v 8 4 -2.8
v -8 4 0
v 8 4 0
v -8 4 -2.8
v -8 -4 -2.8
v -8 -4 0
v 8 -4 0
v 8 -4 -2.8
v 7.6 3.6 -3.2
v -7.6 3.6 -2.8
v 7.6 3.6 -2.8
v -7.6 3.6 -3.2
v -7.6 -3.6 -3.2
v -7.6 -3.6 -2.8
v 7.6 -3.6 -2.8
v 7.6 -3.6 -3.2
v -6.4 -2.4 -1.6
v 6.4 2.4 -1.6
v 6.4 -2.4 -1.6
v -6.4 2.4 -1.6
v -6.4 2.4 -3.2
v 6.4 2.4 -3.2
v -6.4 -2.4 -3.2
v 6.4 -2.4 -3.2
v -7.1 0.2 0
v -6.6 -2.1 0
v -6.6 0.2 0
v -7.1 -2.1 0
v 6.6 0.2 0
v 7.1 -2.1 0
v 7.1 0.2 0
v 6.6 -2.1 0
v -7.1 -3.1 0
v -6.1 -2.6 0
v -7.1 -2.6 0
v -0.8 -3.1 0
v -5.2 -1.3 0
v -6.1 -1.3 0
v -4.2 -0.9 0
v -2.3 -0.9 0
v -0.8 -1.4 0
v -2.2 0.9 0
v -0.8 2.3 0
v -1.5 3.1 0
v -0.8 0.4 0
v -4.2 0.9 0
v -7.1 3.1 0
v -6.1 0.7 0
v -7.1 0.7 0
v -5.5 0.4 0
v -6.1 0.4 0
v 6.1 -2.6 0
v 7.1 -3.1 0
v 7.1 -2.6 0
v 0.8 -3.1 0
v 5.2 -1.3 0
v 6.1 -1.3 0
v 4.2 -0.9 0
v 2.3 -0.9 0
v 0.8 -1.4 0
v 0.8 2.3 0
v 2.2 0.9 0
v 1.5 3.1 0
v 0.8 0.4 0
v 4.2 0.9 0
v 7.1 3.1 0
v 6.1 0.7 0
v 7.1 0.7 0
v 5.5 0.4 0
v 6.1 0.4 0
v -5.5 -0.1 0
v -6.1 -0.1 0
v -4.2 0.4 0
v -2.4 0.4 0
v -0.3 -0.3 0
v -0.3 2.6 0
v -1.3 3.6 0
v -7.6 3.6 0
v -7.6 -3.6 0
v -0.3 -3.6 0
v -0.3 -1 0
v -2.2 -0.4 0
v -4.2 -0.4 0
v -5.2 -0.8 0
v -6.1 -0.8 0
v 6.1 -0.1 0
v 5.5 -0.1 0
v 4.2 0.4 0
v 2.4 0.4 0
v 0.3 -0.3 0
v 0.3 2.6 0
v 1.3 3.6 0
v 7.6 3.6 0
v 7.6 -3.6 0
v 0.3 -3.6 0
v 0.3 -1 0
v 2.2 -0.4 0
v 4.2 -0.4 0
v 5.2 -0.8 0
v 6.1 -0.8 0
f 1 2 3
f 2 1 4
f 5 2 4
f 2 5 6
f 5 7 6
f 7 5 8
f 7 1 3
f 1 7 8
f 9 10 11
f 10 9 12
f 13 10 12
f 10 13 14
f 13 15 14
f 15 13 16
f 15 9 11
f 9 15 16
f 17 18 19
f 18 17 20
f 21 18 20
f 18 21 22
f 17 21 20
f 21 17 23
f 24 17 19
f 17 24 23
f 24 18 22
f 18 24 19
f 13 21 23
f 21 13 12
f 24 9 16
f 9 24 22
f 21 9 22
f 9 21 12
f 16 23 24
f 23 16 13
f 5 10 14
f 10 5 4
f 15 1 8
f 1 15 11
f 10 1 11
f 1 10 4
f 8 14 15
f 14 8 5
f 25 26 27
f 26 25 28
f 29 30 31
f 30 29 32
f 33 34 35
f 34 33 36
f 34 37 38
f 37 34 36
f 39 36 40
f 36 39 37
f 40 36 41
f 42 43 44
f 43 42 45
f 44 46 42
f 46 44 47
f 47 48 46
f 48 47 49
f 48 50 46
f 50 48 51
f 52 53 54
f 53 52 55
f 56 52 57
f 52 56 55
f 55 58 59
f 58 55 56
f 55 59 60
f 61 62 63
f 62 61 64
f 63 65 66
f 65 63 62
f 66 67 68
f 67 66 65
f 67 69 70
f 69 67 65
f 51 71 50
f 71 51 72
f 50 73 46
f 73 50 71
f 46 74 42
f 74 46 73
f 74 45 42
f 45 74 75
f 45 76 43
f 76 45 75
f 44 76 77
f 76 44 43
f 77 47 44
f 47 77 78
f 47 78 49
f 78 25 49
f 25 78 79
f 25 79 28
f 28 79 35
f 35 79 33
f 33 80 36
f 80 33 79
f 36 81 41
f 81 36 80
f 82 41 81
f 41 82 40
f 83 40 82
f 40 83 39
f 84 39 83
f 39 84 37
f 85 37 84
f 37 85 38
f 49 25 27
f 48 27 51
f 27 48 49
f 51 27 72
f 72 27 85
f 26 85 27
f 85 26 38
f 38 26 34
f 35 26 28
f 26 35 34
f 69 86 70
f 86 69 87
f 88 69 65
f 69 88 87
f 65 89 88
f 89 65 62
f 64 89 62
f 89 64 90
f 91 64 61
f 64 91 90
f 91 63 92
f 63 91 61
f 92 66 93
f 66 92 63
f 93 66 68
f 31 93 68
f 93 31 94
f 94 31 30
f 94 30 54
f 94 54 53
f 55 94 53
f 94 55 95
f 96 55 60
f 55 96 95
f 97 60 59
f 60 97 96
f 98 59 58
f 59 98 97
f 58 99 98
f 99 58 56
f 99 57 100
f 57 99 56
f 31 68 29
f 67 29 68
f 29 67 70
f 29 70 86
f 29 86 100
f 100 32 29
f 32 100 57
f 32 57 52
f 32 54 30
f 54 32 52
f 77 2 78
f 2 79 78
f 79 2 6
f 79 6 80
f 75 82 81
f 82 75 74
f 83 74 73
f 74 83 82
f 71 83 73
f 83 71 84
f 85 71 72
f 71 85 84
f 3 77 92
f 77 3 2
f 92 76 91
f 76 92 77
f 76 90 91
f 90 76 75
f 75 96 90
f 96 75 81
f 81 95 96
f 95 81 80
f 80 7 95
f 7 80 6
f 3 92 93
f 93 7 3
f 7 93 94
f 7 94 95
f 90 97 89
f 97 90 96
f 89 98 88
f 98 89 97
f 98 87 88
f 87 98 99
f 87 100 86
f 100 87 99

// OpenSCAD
// file: ../p/box5.scad
use <../lib.scad>
function ldraw_lib__box5() = [
// 0 Box with 5 Faces and All Edges
// 0 Name: box5.dat
// 0 Author: James Jessiman
// 0 !LDRAW_ORG Primitive UPDATE 2012-01
// 0 !LICENSE Licensed under CC BY 4.0 : see CAreadme.txt
// 
// 0 BFC CERTIFY CCW
  [0,"BFC","CERTIFY"],
  [0,"BFC","CCW"],
// 
// 0 !HISTORY 2002-04-03 [sbliss] Modified for BFC compliance
// 0 !HISTORY 2002-04-25 [PTadmin] Official Update 2002-02
// 0 !HISTORY 2007-06-24 [PTadmin] Header formatted for Contributor Agreement
// 0 !HISTORY 2008-07-01 [PTadmin] Official Update 2008-01
// 0 !HISTORY 2012-02-16 [Philo] Changed to CCW
// 0 !HISTORY 2012-03-30 [PTadmin] Official Update 2012-01
// 
// 
// 2 24 1 1 1 -1 1 1
  [2,24,1,1,1,-1,1,1],
// 2 24 -1 1 1 -1 1 -1
  [2,24,-1,1,1,-1,1,-1],
// 2 24 -1 1 -1 1 1 -1
  [2,24,-1,1,-1,1,1,-1],
// 2 24 1 1 -1 1 1 1
  [2,24,1,1,-1,1,1,1],
// 2 24 1 0 1 -1 0 1
  [2,24,1,0,1,-1,0,1],
// 2 24 -1 0 1 -1 0 -1
  [2,24,-1,0,1,-1,0,-1],
// 2 24 -1 0 -1 1 0 -1
  [2,24,-1,0,-1,1,0,-1],
// 2 24 1 0 -1 1 0 1
  [2,24,1,0,-1,1,0,1],
// 2 24 1 0 1 1 1 1
  [2,24,1,0,1,1,1,1],
// 2 24 -1 0 1 -1 1 1
  [2,24,-1,0,1,-1,1,1],
// 2 24 1 0 -1 1 1 -1
  [2,24,1,0,-1,1,1,-1],
// 2 24 -1 0 -1 -1 1 -1
  [2,24,-1,0,-1,-1,1,-1],
// 4 16 -1 1 1 1 1 1 1 1 -1 -1 1 -1
  [4,16,-1,1,1,1,1,1,1,1,-1,-1,1,-1],
// 4 16 -1 1 1 -1 0 1 1 0 1 1 1 1
  [4,16,-1,1,1,-1,0,1,1,0,1,1,1,1],
// 4 16 -1 1 -1 -1 0 -1 -1 0 1 -1 1 1
  [4,16,-1,1,-1,-1,0,-1,-1,0,1,-1,1,1],
// 4 16 1 1 -1 1 0 -1 -1 0 -1 -1 1 -1
  [4,16,1,1,-1,1,0,-1,-1,0,-1,-1,1,-1],
// 4 16 1 1 1 1 0 1 1 0 -1 1 1 -1
  [4,16,1,1,1,1,0,1,1,0,-1,1,1,-1],
];
module ldraw_lib__box5(step=0, col=false, unit=2/5, alt=false, line=0.2, solid=!$preview)
    makepoly(ldraw_lib__box5(), step=step, col=col, unit=unit, alt=alt, line=line, solid=solid);
ldraw_lib__box5(line=0.2);
// file: ../p/box4.scad
use <../lib.scad>
function ldraw_lib__box4() = [
// 0 Box with 4 Faces (2 Parallel Pairs) and All Edges
// 0 Name: box4.dat
// 0 Author: James Jessiman
// 0 !LDRAW_ORG Primitive UPDATE 2012-01
// 0 !LICENSE Licensed under CC BY 4.0 : see CAreadme.txt
// 
// 0 BFC CERTIFY CCW
  [0,"BFC","CERTIFY"],
  [0,"BFC","CCW"],
// 
// 0 !HISTORY 2002-04-03 [sbliss] Modified for BFC compliance
// 0 !HISTORY 2002-04-25 [PTadmin] Official Update 2002-02
// 0 !HISTORY 2007-06-24 [PTadmin] Header formatted for Contributor Agreement
// 0 !HISTORY 2008-07-01 [PTadmin] Official Update 2008-01
// 0 !HISTORY 2012-02-16 [Philo] Changed to CCW
// 0 !HISTORY 2012-03-30 [PTadmin] Official Update 2012-01
// 
// 
// 2 24 1 1 1 -1 1 1
  [2,24,1,1,1,-1,1,1],
// 2 24 -1 1 1 -1 1 -1
  [2,24,-1,1,1,-1,1,-1],
// 2 24 -1 1 -1 1 1 -1
  [2,24,-1,1,-1,1,1,-1],
// 2 24 1 1 -1 1 1 1
  [2,24,1,1,-1,1,1,1],
// 2 24 1 0 1 -1 0 1
  [2,24,1,0,1,-1,0,1],
// 2 24 -1 0 1 -1 0 -1
  [2,24,-1,0,1,-1,0,-1],
// 2 24 -1 0 -1 1 0 -1
  [2,24,-1,0,-1,1,0,-1],
// 2 24 1 0 -1 1 0 1
  [2,24,1,0,-1,1,0,1],
// 2 24 1 0 1 1 1 1
  [2,24,1,0,1,1,1,1],
// 2 24 -1 0 1 -1 1 1
  [2,24,-1,0,1,-1,1,1],
// 2 24 1 0 -1 1 1 -1
  [2,24,1,0,-1,1,1,-1],
// 2 24 -1 0 -1 -1 1 -1
  [2,24,-1,0,-1,-1,1,-1],
// 4 16 -1 1 1 -1 0 1 1 0 1 1 1 1
  [4,16,-1,1,1,-1,0,1,1,0,1,1,1,1],
// 4 16 -1 1 -1 -1 0 -1 -1 0 1 -1 1 1
  [4,16,-1,1,-1,-1,0,-1,-1,0,1,-1,1,1],
// 4 16 1 1 -1 1 0 -1 -1 0 -1 -1 1 -1
  [4,16,1,1,-1,1,0,-1,-1,0,-1,-1,1,-1],
// 4 16 1 1 1 1 0 1 1 0 -1 1 1 -1
  [4,16,1,1,1,1,0,1,1,0,-1,1,1,-1],
];
module ldraw_lib__box4(step=0, col=false, unit=2/5, alt=false, line=0.2, solid=!$preview)
    makepoly(ldraw_lib__box4(), step=step, col=col, unit=unit, alt=alt, line=line, solid=solid);
ldraw_lib__box4(line=0.2);
// file: s/3069bs01.scad
use <../../lib.scad>
use <../../p/box4.scad>
use <../../p/box5.scad>
function ldraw_lib__s__3069bs01() = [
// 0 ~Tile  1 x  2 with Groove without Top Face
// 0 Name: s\3069bs01.dat
// 0 Author: Santeri Piippo [arezey]
// 0 !LDRAW_ORG Subpart UPDATE 2010-02
// 0 !LICENSE Licensed under CC BY 4.0 : see CAreadme.txt
// 
// 0 BFC CERTIFY CCW
  [0,"BFC","CERTIFY"],
  [0,"BFC","CCW"],
// 
// 0 !HISTORY 2010-07-05 [PTadmin] Official Update 2010-02
// 
// 
// 1 16 0 0 0 20 0 0 0 7 0 0 0 10 box4.dat
  [1,16,0,0,0,20,0,0,0,7,0,0,0,10, ldraw_lib__box4()],
// 1 16 0 7 0 19 0 0 0 1 0 0 0 9 box4.dat
  [1,16,0,7,0,19,0,0,0,1,0,0,0,9, ldraw_lib__box4()],
// 0 BFC INVERTNEXT
  [0,"BFC","INVERTNEXT"],
// 1 16 0 8 0 16 0 0 0 -4 0 0 0 6 box5.dat
  [1,16,0,8,0,16,0,0,0,-4,0,0,0,6, ldraw_lib__box5()],
// 4 16 -19 8 9 -16 8 6 -16 8 -6 -19 8 -9
  [4,16,-19,8,9,-16,8,6,-16,8,-6,-19,8,-9],
// 4 16 19 8 -9 16 8 -6 16 8 6 19 8 9
  [4,16,19,8,-9,16,8,-6,16,8,6,19,8,9],
// 4 16 19 8 9 16 8 6 -16 8 6 -19 8 9
  [4,16,19,8,9,16,8,6,-16,8,6,-19,8,9],
// 4 16 -19 8 -9 -16 8 -6 16 8 -6 19 8 -9
  [4,16,-19,8,-9,-16,8,-6,16,8,-6,19,8,-9],
// 4 16 -20 7 10 -19 7 9 -19 7 -9 -20 7 -10
  [4,16,-20,7,10,-19,7,9,-19,7,-9,-20,7,-10],
// 4 16 20 7 -10 19 7 -9 19 7 9 20 7 10
  [4,16,20,7,-10,19,7,-9,19,7,9,20,7,10],
// 4 16 20 7 10 19 7 9 -19 7 9 -20 7 10
  [4,16,20,7,10,19,7,9,-19,7,9,-20,7,10],
// 4 16 -20 7 -10 -19 7 -9 19 7 -9 20 7 -10
  [4,16,-20,7,-10,-19,7,-9,19,7,-9,20,7,-10],
// 0 //
];
module ldraw_lib__s__3069bs01(step=0, col=false, unit=2/5, alt=false, line=0.2, solid=!$preview)
    makepoly(ldraw_lib__s__3069bs01(), step=step, col=col, unit=unit, alt=alt, line=line, solid=solid);
ldraw_lib__s__3069bs01(line=0.2);
// main file
use <../lib.scad>
use <s/3069bs01.scad>
function ldraw_lib__3069bpzf() = [
// 0 Tile  1 x  2 with Silver Armour Pattern
// 0 Name: 3069bpzf.dat
// 0 Author: Vincent Messenet [Cheenzo]
// 0 !LDRAW_ORG Part UPDATE 2019-03
// 0 !LICENSE Licensed under CC BY 4.0 : see CAreadme.txt
// 
// 0 BFC CERTIFY CCW
  [0,"BFC","CERTIFY"],
  [0,"BFC","CCW"],
// 
// 0 !KEYWORDS Armor, Batman, Brickheadz, BrickLink 3069pb0667
// 0 !KEYWORDS Rebrickable 3069bpr0234, Set 41610
// 
// 0 !HISTORY 2019-12-27 [PTadmin] Official Update 2019-03
// 
// 
// 1 16 0 0 0 1 0 0 0 1 0 0 0 1 s\3069bs01.dat
  [1,16,0,0,0,1,0,0,0,1,0,0,0,1, ldraw_lib__s__3069bs01()],
// 
// 4 82 -16.5 0 .5 -17.75 0 .5 -17.75 0 -5.25 -16.5 0 -5.25
  [4,82,-16.5,0,.5,-17.75,0,.5,-17.75,0,-5.25,-16.5,0,-5.25],
// 4 82 17.75 0 -5.25 17.75 0 .5 16.5 0 .5 16.5 0 -5.25
  [4,82,17.75,0,-5.25,17.75,0,.5,16.5,0,.5,16.5,0,-5.25],
// 4 80 -17.75 0 -6.5 -17.75 0 -7.75 -2 0 -7.75 -15.25 0 -6.5
  [4,80,-17.75,0,-6.5,-17.75,0,-7.75,-2,0,-7.75,-15.25,0,-6.5],
// 4 80 -15.25 0 -3.25 -15.25 0 -6.5 -2 0 -7.75 -13 0 -3.25
  [4,80,-15.25,0,-3.25,-15.25,0,-6.5,-2,0,-7.75,-13,0,-3.25],
// 4 80 -10.5 0 -2.25 -13 0 -3.25 -2 0 -7.75 -5.75 0 -2.25
  [4,80,-10.5,0,-2.25,-13,0,-3.25,-2,0,-7.75,-5.75,0,-2.25],
// 3 80 -5.75 0 -2.25 -2 0 -7.75 -2 0 -3.5
  [3,80,-5.75,0,-2.25,-2,0,-7.75,-2,0,-3.5],
// 4 80 -3.75 0 7.75 -5.5 0 2.25 -2 0 1 -2 0 5.75
  [4,80,-3.75,0,7.75,-5.5,0,2.25,-2,0,1,-2,0,5.75],
// 4 80 -10.5 0 2.25 -5.5 0 2.25 -3.75 0 7.75 -17.75 0 7.75
  [4,80,-10.5,0,2.25,-5.5,0,2.25,-3.75,0,7.75,-17.75,0,7.75],
// 4 80 -10.5 0 2.25 -17.75 0 7.75 -17.75 0 1.75 -15.25 0 1.75
  [4,80,-10.5,0,2.25,-17.75,0,7.75,-17.75,0,1.75,-15.25,0,1.75],
// 4 80 -10.5 0 2.25 -15.25 0 1.75 -15.25 0 1 -13.75 0 1
  [4,80,-10.5,0,2.25,-15.25,0,1.75,-15.25,0,1,-13.75,0,1],
// 4 80 2 0 -7.75 17.75 0 -7.75 17.75 0 -6.5 15.25 0 -6.5
  [4,80,2,0,-7.75,17.75,0,-7.75,17.75,0,-6.5,15.25,0,-6.5],
// 4 80 2 0 -7.75 15.25 0 -6.5 15.25 0 -3.25 13 0 -3.25
  [4,80,2,0,-7.75,15.25,0,-6.5,15.25,0,-3.25,13,0,-3.25],
// 4 80 2 0 -7.75 13 0 -3.25 10.5 0 -2.25 5.75 0 -2.25
  [4,80,2,0,-7.75,13,0,-3.25,10.5,0,-2.25,5.75,0,-2.25],
// 3 80 2 0 -7.75 5.75 0 -2.25 2 0 -3.5
  [3,80,2,0,-7.75,5.75,0,-2.25,2,0,-3.5],
// 4 80 2 0 1 5.5 0 2.25 3.75 0 7.75 2 0 5.75
  [4,80,2,0,1,5.5,0,2.25,3.75,0,7.75,2,0,5.75],
// 4 80 3.75 0 7.75 5.5 0 2.25 10.5 0 2.25 17.75 0 7.75
  [4,80,3.75,0,7.75,5.5,0,2.25,10.5,0,2.25,17.75,0,7.75],
// 4 80 17.75 0 1.75 17.75 0 7.75 10.5 0 2.25 15.25 0 1.75
  [4,80,17.75,0,1.75,17.75,0,7.75,10.5,0,2.25,15.25,0,1.75],
// 4 80 15.25 0 1 15.25 0 1.75 10.5 0 2.25 13.75 0 1
  [4,80,15.25,0,1,15.25,0,1.75,10.5,0,2.25,13.75,0,1],
// 4 0 -13.75 0 -.25 -13.75 0 1 -15.25 0 1 -15.25 0 -.25
  [4,0,-13.75,0,-.25,-13.75,0,1,-15.25,0,1,-15.25,0,-.25],
// 4 0 -10.5 0 1 -10.5 0 2.25 -13.75 0 1 -13.75 0 -.25
  [4,0,-10.5,0,1,-10.5,0,2.25,-13.75,0,1,-13.75,0,-.25],
// 4 0 -6 0 1 -5.5 0 2.25 -10.5 0 2.25 -10.5 0 1
  [4,0,-6,0,1,-5.5,0,2.25,-10.5,0,2.25,-10.5,0,1],
// 4 0 -.75 0 -.75 -2 0 1 -5.5 0 2.25 -6 0 1
  [4,0,-.75,0,-.75,-2,0,1,-5.5,0,2.25,-6,0,1],
// 4 0 -.75 0 -.75 -.75 0 6.5 -2 0 5.75 -2 0 1
  [4,0,-.75,0,-.75,-.75,0,6.5,-2,0,5.75,-2,0,1],
// 4 0 -3.25 0 9 -3.75 0 7.75 -2 0 5.75 -.75 0 6.5
  [4,0,-3.25,0,9,-3.75,0,7.75,-2,0,5.75,-.75,0,6.5],
// 4 0 -19 0 9 -17.75 0 7.75 -3.75 0 7.75 -3.25 0 9
  [4,0,-19,0,9,-17.75,0,7.75,-3.75,0,7.75,-3.25,0,9],
// 3 0 -17.75 0 7.75 -19 0 9 -17.75 0 1.75
  [3,0,-17.75,0,7.75,-19,0,9,-17.75,0,1.75],
// 4 0 -17.75 0 1.75 -19 0 9 -19 0 -9 -17.75 0 .5
  [4,0,-17.75,0,1.75,-19,0,9,-19,0,-9,-17.75,0,.5],
// 3 0 -17.75 0 .5 -19 0 -9 -17.75 0 -5.25
  [3,0,-17.75,0,.5,-19,0,-9,-17.75,0,-5.25],
// 3 0 -17.75 0 -5.25 -19 0 -9 -17.75 0 -6.5
  [3,0,-17.75,0,-5.25,-19,0,-9,-17.75,0,-6.5],
// 3 0 -17.75 0 -6.5 -19 0 -9 -17.75 0 -7.75
  [3,0,-17.75,0,-6.5,-19,0,-9,-17.75,0,-7.75],
// 4 0 -19 0 -9 -.75 0 -9 -2 0 -7.75 -17.75 0 -7.75
  [4,0,-19,0,-9,-.75,0,-9,-2,0,-7.75,-17.75,0,-7.75],
// 4 0 -2 0 -3.5 -2 0 -7.75 -.75 0 -9 -.75 0 -2.5
  [4,0,-2,0,-3.5,-2,0,-7.75,-.75,0,-9,-.75,0,-2.5],
// 4 0 -.75 0 -2.5 -5.5 0 -1 -5.75 0 -2.25 -2 0 -3.5
  [4,0,-.75,0,-2.5,-5.5,0,-1,-5.75,0,-2.25,-2,0,-3.5],
// 4 0 -5.5 0 -1 -10.5 0 -1 -10.5 0 -2.25 -5.75 0 -2.25
  [4,0,-5.5,0,-1,-10.5,0,-1,-10.5,0,-2.25,-5.75,0,-2.25],
// 4 0 -10.5 0 -1 -13 0 -2 -13 0 -3.25 -10.5 0 -2.25
  [4,0,-10.5,0,-1,-13,0,-2,-13,0,-3.25,-10.5,0,-2.25],
// 4 0 -15.25 0 -3.25 -13 0 -3.25 -13 0 -2 -15.25 0 -2
  [4,0,-15.25,0,-3.25,-13,0,-3.25,-13,0,-2,-15.25,0,-2],
// 3 0 -17.75 0 1.75 -17.75 0 .5 -16.5 0 .5
  [3,0,-17.75,0,1.75,-17.75,0,.5,-16.5,0,.5],
// 4 0 -15.25 0 1 -15.25 0 1.75 -17.75 0 1.75 -16.5 0 .5
  [4,0,-15.25,0,1,-15.25,0,1.75,-17.75,0,1.75,-16.5,0,.5],
// 3 0 -15.25 0 1 -16.5 0 .5 -15.25 0 -.25
  [3,0,-15.25,0,1,-16.5,0,.5,-15.25,0,-.25],
// 3 0 -15.25 0 -.25 -16.5 0 .5 -15.25 0 -2
  [3,0,-15.25,0,-.25,-16.5,0,.5,-15.25,0,-2],
// 4 0 -15.25 0 -3.25 -15.25 0 -2 -16.5 0 .5 -16.5 0 -5.25
  [4,0,-15.25,0,-3.25,-15.25,0,-2,-16.5,0,.5,-16.5,0,-5.25],
// 3 0 -15.25 0 -3.25 -16.5 0 -5.25 -15.25 0 -6.5
  [3,0,-15.25,0,-3.25,-16.5,0,-5.25,-15.25,0,-6.5],
// 4 0 -17.75 0 -5.25 -17.75 0 -6.5 -15.25 0 -6.5 -16.5 0 -5.25
  [4,0,-17.75,0,-5.25,-17.75,0,-6.5,-15.25,0,-6.5,-16.5,0,-5.25],
// 4 0 15.25 0 1 13.75 0 1 13.75 0 -.25 15.25 0 -.25
  [4,0,15.25,0,1,13.75,0,1,13.75,0,-.25,15.25,0,-.25],
// 4 0 13.75 0 1 10.5 0 2.25 10.5 0 1 13.75 0 -.25
  [4,0,13.75,0,1,10.5,0,2.25,10.5,0,1,13.75,0,-.25],
// 4 0 10.5 0 2.25 5.5 0 2.25 6 0 1 10.5 0 1
  [4,0,10.5,0,2.25,5.5,0,2.25,6,0,1,10.5,0,1],
// 4 0 5.5 0 2.25 2 0 1 .75 0 -.75 6 0 1
  [4,0,5.5,0,2.25,2,0,1,.75,0,-.75,6,0,1],
// 4 0 2 0 5.75 .75 0 6.5 .75 0 -.75 2 0 1
  [4,0,2,0,5.75,.75,0,6.5,.75,0,-.75,2,0,1],
// 4 0 2 0 5.75 3.75 0 7.75 3.25 0 9 .75 0 6.5
  [4,0,2,0,5.75,3.75,0,7.75,3.25,0,9,.75,0,6.5],
// 4 0 3.75 0 7.75 17.75 0 7.75 19 0 9 3.25 0 9
  [4,0,3.75,0,7.75,17.75,0,7.75,19,0,9,3.25,0,9],
// 3 0 19 0 9 17.75 0 7.75 17.75 0 1.75
  [3,0,19,0,9,17.75,0,7.75,17.75,0,1.75],
// 4 0 19 0 -9 19 0 9 17.75 0 1.75 17.75 0 .5
  [4,0,19,0,-9,19,0,9,17.75,0,1.75,17.75,0,.5],
// 3 0 19 0 -9 17.75 0 .5 17.75 0 -5.25
  [3,0,19,0,-9,17.75,0,.5,17.75,0,-5.25],
// 3 0 19 0 -9 17.75 0 -5.25 17.75 0 -6.5
  [3,0,19,0,-9,17.75,0,-5.25,17.75,0,-6.5],
// 3 0 19 0 -9 17.75 0 -6.5 17.75 0 -7.75
  [3,0,19,0,-9,17.75,0,-6.5,17.75,0,-7.75],
// 4 0 2 0 -7.75 .75 0 -9 19 0 -9 17.75 0 -7.75
  [4,0,2,0,-7.75,.75,0,-9,19,0,-9,17.75,0,-7.75],
// 4 0 .75 0 -9 2 0 -7.75 2 0 -3.5 .75 0 -2.5
  [4,0,.75,0,-9,2,0,-7.75,2,0,-3.5,.75,0,-2.5],
// 4 0 5.75 0 -2.25 5.5 0 -1 .75 0 -2.5 2 0 -3.5
  [4,0,5.75,0,-2.25,5.5,0,-1,.75,0,-2.5,2,0,-3.5],
// 4 0 10.5 0 -2.25 10.5 0 -1 5.5 0 -1 5.75 0 -2.25
  [4,0,10.5,0,-2.25,10.5,0,-1,5.5,0,-1,5.75,0,-2.25],
// 4 0 13 0 -3.25 13 0 -2 10.5 0 -1 10.5 0 -2.25
  [4,0,13,0,-3.25,13,0,-2,10.5,0,-1,10.5,0,-2.25],
// 4 0 13 0 -2 13 0 -3.25 15.25 0 -3.25 15.25 0 -2
  [4,0,13,0,-2,13,0,-3.25,15.25,0,-3.25,15.25,0,-2],
// 3 0 17.75 0 .5 17.75 0 1.75 16.5 0 .5
  [3,0,17.75,0,.5,17.75,0,1.75,16.5,0,.5],
// 4 0 17.75 0 1.75 15.25 0 1.75 15.25 0 1 16.5 0 .5
  [4,0,17.75,0,1.75,15.25,0,1.75,15.25,0,1,16.5,0,.5],
// 3 0 16.5 0 .5 15.25 0 1 15.25 0 -.25
  [3,0,16.5,0,.5,15.25,0,1,15.25,0,-.25],
// 3 0 16.5 0 .5 15.25 0 -.25 15.25 0 -2
  [3,0,16.5,0,.5,15.25,0,-.25,15.25,0,-2],
// 4 0 16.5 0 .5 15.25 0 -2 15.25 0 -3.25 16.5 0 -5.25
  [4,0,16.5,0,.5,15.25,0,-2,15.25,0,-3.25,16.5,0,-5.25],
// 3 0 16.5 0 -5.25 15.25 0 -3.25 15.25 0 -6.5
  [3,0,16.5,0,-5.25,15.25,0,-3.25,15.25,0,-6.5],
// 4 0 15.25 0 -6.5 17.75 0 -6.5 17.75 0 -5.25 16.5 0 -5.25
  [4,0,15.25,0,-6.5,17.75,0,-6.5,17.75,0,-5.25,16.5,0,-5.25],
// 3 16 -3.25 0 9 -20 0 10 -19 0 9
  [3,16,-3.25,0,9,-20,0,10,-19,0,9],
// 4 16 -19 0 -9 -19 0 9 -20 0 10 -20 0 -10
  [4,16,-19,0,-9,-19,0,9,-20,0,10,-20,0,-10],
// 3 16 -19 0 -9 -20 0 -10 -.75 0 -9
  [3,16,-19,0,-9,-20,0,-10,-.75,0,-9],
// 4 16 -6 0 1 -5.5 0 -1 -.75 0 -2.5 -.75 0 -.75
  [4,16,-6,0,1,-5.5,0,-1,-.75,0,-2.5,-.75,0,-.75],
// 4 16 -10.5 0 1 -10.5 0 -1 -5.5 0 -1 -6 0 1
  [4,16,-10.5,0,1,-10.5,0,-1,-5.5,0,-1,-6,0,1],
// 4 16 -13.75 0 -.25 -13 0 -2 -10.5 0 -1 -10.5 0 1
  [4,16,-13.75,0,-.25,-13,0,-2,-10.5,0,-1,-10.5,0,1],
// 4 16 -15.25 0 -.25 -15.25 0 -2 -13 0 -2 -13.75 0 -.25
  [4,16,-15.25,0,-.25,-15.25,0,-2,-13,0,-2,-13.75,0,-.25],
// 4 16 -20 0 10 -3.25 0 9 3.25 0 9 20 0 10
  [4,16,-20,0,10,-3.25,0,9,3.25,0,9,20,0,10],
// 4 16 .75 0 6.5 3.25 0 9 -3.25 0 9 -.75 0 6.5
  [4,16,.75,0,6.5,3.25,0,9,-3.25,0,9,-.75,0,6.5],
// 4 16 .75 0 -.75 .75 0 6.5 -.75 0 6.5 -.75 0 -.75
  [4,16,.75,0,-.75,.75,0,6.5,-.75,0,6.5,-.75,0,-.75],
// 4 16 .75 0 -2.5 .75 0 -.75 -.75 0 -.75 -.75 0 -2.5
  [4,16,.75,0,-2.5,.75,0,-.75,-.75,0,-.75,-.75,0,-2.5],
// 4 16 .75 0 -9 .75 0 -2.5 -.75 0 -2.5 -.75 0 -9
  [4,16,.75,0,-9,.75,0,-2.5,-.75,0,-2.5,-.75,0,-9],
// 4 16 20 0 -10 .75 0 -9 -.75 0 -9 -20 0 -10
  [4,16,20,0,-10,.75,0,-9,-.75,0,-9,-20,0,-10],
// 3 16 20 0 10 3.25 0 9 19 0 9
  [3,16,20,0,10,3.25,0,9,19,0,9],
// 4 16 20 0 10 19 0 9 19 0 -9 20 0 -10
  [4,16,20,0,10,19,0,9,19,0,-9,20,0,-10],
// 3 16 20 0 -10 19 0 -9 .75 0 -9
  [3,16,20,0,-10,19,0,-9,.75,0,-9],
// 4 16 .75 0 -2.5 5.5 0 -1 6 0 1 .75 0 -.75
  [4,16,.75,0,-2.5,5.5,0,-1,6,0,1,.75,0,-.75],
// 4 16 5.5 0 -1 10.5 0 -1 10.5 0 1 6 0 1
  [4,16,5.5,0,-1,10.5,0,-1,10.5,0,1,6,0,1],
// 4 16 10.5 0 -1 13 0 -2 13.75 0 -.25 10.5 0 1
  [4,16,10.5,0,-1,13,0,-2,13.75,0,-.25,10.5,0,1],
// 4 16 13 0 -2 15.25 0 -2 15.25 0 -.25 13.75 0 -.25
  [4,16,13,0,-2,15.25,0,-2,15.25,0,-.25,13.75,0,-.25],
];
module ldraw_lib__3069bpzf(step=0, col=false, unit=2/5, alt=false, line=0.2, solid=!$preview)
    makepoly(ldraw_lib__3069bpzf(), step=step, col=col, unit=unit, alt=alt, line=line, solid=solid);
ldraw_lib__3069bpzf(line=0.2);
